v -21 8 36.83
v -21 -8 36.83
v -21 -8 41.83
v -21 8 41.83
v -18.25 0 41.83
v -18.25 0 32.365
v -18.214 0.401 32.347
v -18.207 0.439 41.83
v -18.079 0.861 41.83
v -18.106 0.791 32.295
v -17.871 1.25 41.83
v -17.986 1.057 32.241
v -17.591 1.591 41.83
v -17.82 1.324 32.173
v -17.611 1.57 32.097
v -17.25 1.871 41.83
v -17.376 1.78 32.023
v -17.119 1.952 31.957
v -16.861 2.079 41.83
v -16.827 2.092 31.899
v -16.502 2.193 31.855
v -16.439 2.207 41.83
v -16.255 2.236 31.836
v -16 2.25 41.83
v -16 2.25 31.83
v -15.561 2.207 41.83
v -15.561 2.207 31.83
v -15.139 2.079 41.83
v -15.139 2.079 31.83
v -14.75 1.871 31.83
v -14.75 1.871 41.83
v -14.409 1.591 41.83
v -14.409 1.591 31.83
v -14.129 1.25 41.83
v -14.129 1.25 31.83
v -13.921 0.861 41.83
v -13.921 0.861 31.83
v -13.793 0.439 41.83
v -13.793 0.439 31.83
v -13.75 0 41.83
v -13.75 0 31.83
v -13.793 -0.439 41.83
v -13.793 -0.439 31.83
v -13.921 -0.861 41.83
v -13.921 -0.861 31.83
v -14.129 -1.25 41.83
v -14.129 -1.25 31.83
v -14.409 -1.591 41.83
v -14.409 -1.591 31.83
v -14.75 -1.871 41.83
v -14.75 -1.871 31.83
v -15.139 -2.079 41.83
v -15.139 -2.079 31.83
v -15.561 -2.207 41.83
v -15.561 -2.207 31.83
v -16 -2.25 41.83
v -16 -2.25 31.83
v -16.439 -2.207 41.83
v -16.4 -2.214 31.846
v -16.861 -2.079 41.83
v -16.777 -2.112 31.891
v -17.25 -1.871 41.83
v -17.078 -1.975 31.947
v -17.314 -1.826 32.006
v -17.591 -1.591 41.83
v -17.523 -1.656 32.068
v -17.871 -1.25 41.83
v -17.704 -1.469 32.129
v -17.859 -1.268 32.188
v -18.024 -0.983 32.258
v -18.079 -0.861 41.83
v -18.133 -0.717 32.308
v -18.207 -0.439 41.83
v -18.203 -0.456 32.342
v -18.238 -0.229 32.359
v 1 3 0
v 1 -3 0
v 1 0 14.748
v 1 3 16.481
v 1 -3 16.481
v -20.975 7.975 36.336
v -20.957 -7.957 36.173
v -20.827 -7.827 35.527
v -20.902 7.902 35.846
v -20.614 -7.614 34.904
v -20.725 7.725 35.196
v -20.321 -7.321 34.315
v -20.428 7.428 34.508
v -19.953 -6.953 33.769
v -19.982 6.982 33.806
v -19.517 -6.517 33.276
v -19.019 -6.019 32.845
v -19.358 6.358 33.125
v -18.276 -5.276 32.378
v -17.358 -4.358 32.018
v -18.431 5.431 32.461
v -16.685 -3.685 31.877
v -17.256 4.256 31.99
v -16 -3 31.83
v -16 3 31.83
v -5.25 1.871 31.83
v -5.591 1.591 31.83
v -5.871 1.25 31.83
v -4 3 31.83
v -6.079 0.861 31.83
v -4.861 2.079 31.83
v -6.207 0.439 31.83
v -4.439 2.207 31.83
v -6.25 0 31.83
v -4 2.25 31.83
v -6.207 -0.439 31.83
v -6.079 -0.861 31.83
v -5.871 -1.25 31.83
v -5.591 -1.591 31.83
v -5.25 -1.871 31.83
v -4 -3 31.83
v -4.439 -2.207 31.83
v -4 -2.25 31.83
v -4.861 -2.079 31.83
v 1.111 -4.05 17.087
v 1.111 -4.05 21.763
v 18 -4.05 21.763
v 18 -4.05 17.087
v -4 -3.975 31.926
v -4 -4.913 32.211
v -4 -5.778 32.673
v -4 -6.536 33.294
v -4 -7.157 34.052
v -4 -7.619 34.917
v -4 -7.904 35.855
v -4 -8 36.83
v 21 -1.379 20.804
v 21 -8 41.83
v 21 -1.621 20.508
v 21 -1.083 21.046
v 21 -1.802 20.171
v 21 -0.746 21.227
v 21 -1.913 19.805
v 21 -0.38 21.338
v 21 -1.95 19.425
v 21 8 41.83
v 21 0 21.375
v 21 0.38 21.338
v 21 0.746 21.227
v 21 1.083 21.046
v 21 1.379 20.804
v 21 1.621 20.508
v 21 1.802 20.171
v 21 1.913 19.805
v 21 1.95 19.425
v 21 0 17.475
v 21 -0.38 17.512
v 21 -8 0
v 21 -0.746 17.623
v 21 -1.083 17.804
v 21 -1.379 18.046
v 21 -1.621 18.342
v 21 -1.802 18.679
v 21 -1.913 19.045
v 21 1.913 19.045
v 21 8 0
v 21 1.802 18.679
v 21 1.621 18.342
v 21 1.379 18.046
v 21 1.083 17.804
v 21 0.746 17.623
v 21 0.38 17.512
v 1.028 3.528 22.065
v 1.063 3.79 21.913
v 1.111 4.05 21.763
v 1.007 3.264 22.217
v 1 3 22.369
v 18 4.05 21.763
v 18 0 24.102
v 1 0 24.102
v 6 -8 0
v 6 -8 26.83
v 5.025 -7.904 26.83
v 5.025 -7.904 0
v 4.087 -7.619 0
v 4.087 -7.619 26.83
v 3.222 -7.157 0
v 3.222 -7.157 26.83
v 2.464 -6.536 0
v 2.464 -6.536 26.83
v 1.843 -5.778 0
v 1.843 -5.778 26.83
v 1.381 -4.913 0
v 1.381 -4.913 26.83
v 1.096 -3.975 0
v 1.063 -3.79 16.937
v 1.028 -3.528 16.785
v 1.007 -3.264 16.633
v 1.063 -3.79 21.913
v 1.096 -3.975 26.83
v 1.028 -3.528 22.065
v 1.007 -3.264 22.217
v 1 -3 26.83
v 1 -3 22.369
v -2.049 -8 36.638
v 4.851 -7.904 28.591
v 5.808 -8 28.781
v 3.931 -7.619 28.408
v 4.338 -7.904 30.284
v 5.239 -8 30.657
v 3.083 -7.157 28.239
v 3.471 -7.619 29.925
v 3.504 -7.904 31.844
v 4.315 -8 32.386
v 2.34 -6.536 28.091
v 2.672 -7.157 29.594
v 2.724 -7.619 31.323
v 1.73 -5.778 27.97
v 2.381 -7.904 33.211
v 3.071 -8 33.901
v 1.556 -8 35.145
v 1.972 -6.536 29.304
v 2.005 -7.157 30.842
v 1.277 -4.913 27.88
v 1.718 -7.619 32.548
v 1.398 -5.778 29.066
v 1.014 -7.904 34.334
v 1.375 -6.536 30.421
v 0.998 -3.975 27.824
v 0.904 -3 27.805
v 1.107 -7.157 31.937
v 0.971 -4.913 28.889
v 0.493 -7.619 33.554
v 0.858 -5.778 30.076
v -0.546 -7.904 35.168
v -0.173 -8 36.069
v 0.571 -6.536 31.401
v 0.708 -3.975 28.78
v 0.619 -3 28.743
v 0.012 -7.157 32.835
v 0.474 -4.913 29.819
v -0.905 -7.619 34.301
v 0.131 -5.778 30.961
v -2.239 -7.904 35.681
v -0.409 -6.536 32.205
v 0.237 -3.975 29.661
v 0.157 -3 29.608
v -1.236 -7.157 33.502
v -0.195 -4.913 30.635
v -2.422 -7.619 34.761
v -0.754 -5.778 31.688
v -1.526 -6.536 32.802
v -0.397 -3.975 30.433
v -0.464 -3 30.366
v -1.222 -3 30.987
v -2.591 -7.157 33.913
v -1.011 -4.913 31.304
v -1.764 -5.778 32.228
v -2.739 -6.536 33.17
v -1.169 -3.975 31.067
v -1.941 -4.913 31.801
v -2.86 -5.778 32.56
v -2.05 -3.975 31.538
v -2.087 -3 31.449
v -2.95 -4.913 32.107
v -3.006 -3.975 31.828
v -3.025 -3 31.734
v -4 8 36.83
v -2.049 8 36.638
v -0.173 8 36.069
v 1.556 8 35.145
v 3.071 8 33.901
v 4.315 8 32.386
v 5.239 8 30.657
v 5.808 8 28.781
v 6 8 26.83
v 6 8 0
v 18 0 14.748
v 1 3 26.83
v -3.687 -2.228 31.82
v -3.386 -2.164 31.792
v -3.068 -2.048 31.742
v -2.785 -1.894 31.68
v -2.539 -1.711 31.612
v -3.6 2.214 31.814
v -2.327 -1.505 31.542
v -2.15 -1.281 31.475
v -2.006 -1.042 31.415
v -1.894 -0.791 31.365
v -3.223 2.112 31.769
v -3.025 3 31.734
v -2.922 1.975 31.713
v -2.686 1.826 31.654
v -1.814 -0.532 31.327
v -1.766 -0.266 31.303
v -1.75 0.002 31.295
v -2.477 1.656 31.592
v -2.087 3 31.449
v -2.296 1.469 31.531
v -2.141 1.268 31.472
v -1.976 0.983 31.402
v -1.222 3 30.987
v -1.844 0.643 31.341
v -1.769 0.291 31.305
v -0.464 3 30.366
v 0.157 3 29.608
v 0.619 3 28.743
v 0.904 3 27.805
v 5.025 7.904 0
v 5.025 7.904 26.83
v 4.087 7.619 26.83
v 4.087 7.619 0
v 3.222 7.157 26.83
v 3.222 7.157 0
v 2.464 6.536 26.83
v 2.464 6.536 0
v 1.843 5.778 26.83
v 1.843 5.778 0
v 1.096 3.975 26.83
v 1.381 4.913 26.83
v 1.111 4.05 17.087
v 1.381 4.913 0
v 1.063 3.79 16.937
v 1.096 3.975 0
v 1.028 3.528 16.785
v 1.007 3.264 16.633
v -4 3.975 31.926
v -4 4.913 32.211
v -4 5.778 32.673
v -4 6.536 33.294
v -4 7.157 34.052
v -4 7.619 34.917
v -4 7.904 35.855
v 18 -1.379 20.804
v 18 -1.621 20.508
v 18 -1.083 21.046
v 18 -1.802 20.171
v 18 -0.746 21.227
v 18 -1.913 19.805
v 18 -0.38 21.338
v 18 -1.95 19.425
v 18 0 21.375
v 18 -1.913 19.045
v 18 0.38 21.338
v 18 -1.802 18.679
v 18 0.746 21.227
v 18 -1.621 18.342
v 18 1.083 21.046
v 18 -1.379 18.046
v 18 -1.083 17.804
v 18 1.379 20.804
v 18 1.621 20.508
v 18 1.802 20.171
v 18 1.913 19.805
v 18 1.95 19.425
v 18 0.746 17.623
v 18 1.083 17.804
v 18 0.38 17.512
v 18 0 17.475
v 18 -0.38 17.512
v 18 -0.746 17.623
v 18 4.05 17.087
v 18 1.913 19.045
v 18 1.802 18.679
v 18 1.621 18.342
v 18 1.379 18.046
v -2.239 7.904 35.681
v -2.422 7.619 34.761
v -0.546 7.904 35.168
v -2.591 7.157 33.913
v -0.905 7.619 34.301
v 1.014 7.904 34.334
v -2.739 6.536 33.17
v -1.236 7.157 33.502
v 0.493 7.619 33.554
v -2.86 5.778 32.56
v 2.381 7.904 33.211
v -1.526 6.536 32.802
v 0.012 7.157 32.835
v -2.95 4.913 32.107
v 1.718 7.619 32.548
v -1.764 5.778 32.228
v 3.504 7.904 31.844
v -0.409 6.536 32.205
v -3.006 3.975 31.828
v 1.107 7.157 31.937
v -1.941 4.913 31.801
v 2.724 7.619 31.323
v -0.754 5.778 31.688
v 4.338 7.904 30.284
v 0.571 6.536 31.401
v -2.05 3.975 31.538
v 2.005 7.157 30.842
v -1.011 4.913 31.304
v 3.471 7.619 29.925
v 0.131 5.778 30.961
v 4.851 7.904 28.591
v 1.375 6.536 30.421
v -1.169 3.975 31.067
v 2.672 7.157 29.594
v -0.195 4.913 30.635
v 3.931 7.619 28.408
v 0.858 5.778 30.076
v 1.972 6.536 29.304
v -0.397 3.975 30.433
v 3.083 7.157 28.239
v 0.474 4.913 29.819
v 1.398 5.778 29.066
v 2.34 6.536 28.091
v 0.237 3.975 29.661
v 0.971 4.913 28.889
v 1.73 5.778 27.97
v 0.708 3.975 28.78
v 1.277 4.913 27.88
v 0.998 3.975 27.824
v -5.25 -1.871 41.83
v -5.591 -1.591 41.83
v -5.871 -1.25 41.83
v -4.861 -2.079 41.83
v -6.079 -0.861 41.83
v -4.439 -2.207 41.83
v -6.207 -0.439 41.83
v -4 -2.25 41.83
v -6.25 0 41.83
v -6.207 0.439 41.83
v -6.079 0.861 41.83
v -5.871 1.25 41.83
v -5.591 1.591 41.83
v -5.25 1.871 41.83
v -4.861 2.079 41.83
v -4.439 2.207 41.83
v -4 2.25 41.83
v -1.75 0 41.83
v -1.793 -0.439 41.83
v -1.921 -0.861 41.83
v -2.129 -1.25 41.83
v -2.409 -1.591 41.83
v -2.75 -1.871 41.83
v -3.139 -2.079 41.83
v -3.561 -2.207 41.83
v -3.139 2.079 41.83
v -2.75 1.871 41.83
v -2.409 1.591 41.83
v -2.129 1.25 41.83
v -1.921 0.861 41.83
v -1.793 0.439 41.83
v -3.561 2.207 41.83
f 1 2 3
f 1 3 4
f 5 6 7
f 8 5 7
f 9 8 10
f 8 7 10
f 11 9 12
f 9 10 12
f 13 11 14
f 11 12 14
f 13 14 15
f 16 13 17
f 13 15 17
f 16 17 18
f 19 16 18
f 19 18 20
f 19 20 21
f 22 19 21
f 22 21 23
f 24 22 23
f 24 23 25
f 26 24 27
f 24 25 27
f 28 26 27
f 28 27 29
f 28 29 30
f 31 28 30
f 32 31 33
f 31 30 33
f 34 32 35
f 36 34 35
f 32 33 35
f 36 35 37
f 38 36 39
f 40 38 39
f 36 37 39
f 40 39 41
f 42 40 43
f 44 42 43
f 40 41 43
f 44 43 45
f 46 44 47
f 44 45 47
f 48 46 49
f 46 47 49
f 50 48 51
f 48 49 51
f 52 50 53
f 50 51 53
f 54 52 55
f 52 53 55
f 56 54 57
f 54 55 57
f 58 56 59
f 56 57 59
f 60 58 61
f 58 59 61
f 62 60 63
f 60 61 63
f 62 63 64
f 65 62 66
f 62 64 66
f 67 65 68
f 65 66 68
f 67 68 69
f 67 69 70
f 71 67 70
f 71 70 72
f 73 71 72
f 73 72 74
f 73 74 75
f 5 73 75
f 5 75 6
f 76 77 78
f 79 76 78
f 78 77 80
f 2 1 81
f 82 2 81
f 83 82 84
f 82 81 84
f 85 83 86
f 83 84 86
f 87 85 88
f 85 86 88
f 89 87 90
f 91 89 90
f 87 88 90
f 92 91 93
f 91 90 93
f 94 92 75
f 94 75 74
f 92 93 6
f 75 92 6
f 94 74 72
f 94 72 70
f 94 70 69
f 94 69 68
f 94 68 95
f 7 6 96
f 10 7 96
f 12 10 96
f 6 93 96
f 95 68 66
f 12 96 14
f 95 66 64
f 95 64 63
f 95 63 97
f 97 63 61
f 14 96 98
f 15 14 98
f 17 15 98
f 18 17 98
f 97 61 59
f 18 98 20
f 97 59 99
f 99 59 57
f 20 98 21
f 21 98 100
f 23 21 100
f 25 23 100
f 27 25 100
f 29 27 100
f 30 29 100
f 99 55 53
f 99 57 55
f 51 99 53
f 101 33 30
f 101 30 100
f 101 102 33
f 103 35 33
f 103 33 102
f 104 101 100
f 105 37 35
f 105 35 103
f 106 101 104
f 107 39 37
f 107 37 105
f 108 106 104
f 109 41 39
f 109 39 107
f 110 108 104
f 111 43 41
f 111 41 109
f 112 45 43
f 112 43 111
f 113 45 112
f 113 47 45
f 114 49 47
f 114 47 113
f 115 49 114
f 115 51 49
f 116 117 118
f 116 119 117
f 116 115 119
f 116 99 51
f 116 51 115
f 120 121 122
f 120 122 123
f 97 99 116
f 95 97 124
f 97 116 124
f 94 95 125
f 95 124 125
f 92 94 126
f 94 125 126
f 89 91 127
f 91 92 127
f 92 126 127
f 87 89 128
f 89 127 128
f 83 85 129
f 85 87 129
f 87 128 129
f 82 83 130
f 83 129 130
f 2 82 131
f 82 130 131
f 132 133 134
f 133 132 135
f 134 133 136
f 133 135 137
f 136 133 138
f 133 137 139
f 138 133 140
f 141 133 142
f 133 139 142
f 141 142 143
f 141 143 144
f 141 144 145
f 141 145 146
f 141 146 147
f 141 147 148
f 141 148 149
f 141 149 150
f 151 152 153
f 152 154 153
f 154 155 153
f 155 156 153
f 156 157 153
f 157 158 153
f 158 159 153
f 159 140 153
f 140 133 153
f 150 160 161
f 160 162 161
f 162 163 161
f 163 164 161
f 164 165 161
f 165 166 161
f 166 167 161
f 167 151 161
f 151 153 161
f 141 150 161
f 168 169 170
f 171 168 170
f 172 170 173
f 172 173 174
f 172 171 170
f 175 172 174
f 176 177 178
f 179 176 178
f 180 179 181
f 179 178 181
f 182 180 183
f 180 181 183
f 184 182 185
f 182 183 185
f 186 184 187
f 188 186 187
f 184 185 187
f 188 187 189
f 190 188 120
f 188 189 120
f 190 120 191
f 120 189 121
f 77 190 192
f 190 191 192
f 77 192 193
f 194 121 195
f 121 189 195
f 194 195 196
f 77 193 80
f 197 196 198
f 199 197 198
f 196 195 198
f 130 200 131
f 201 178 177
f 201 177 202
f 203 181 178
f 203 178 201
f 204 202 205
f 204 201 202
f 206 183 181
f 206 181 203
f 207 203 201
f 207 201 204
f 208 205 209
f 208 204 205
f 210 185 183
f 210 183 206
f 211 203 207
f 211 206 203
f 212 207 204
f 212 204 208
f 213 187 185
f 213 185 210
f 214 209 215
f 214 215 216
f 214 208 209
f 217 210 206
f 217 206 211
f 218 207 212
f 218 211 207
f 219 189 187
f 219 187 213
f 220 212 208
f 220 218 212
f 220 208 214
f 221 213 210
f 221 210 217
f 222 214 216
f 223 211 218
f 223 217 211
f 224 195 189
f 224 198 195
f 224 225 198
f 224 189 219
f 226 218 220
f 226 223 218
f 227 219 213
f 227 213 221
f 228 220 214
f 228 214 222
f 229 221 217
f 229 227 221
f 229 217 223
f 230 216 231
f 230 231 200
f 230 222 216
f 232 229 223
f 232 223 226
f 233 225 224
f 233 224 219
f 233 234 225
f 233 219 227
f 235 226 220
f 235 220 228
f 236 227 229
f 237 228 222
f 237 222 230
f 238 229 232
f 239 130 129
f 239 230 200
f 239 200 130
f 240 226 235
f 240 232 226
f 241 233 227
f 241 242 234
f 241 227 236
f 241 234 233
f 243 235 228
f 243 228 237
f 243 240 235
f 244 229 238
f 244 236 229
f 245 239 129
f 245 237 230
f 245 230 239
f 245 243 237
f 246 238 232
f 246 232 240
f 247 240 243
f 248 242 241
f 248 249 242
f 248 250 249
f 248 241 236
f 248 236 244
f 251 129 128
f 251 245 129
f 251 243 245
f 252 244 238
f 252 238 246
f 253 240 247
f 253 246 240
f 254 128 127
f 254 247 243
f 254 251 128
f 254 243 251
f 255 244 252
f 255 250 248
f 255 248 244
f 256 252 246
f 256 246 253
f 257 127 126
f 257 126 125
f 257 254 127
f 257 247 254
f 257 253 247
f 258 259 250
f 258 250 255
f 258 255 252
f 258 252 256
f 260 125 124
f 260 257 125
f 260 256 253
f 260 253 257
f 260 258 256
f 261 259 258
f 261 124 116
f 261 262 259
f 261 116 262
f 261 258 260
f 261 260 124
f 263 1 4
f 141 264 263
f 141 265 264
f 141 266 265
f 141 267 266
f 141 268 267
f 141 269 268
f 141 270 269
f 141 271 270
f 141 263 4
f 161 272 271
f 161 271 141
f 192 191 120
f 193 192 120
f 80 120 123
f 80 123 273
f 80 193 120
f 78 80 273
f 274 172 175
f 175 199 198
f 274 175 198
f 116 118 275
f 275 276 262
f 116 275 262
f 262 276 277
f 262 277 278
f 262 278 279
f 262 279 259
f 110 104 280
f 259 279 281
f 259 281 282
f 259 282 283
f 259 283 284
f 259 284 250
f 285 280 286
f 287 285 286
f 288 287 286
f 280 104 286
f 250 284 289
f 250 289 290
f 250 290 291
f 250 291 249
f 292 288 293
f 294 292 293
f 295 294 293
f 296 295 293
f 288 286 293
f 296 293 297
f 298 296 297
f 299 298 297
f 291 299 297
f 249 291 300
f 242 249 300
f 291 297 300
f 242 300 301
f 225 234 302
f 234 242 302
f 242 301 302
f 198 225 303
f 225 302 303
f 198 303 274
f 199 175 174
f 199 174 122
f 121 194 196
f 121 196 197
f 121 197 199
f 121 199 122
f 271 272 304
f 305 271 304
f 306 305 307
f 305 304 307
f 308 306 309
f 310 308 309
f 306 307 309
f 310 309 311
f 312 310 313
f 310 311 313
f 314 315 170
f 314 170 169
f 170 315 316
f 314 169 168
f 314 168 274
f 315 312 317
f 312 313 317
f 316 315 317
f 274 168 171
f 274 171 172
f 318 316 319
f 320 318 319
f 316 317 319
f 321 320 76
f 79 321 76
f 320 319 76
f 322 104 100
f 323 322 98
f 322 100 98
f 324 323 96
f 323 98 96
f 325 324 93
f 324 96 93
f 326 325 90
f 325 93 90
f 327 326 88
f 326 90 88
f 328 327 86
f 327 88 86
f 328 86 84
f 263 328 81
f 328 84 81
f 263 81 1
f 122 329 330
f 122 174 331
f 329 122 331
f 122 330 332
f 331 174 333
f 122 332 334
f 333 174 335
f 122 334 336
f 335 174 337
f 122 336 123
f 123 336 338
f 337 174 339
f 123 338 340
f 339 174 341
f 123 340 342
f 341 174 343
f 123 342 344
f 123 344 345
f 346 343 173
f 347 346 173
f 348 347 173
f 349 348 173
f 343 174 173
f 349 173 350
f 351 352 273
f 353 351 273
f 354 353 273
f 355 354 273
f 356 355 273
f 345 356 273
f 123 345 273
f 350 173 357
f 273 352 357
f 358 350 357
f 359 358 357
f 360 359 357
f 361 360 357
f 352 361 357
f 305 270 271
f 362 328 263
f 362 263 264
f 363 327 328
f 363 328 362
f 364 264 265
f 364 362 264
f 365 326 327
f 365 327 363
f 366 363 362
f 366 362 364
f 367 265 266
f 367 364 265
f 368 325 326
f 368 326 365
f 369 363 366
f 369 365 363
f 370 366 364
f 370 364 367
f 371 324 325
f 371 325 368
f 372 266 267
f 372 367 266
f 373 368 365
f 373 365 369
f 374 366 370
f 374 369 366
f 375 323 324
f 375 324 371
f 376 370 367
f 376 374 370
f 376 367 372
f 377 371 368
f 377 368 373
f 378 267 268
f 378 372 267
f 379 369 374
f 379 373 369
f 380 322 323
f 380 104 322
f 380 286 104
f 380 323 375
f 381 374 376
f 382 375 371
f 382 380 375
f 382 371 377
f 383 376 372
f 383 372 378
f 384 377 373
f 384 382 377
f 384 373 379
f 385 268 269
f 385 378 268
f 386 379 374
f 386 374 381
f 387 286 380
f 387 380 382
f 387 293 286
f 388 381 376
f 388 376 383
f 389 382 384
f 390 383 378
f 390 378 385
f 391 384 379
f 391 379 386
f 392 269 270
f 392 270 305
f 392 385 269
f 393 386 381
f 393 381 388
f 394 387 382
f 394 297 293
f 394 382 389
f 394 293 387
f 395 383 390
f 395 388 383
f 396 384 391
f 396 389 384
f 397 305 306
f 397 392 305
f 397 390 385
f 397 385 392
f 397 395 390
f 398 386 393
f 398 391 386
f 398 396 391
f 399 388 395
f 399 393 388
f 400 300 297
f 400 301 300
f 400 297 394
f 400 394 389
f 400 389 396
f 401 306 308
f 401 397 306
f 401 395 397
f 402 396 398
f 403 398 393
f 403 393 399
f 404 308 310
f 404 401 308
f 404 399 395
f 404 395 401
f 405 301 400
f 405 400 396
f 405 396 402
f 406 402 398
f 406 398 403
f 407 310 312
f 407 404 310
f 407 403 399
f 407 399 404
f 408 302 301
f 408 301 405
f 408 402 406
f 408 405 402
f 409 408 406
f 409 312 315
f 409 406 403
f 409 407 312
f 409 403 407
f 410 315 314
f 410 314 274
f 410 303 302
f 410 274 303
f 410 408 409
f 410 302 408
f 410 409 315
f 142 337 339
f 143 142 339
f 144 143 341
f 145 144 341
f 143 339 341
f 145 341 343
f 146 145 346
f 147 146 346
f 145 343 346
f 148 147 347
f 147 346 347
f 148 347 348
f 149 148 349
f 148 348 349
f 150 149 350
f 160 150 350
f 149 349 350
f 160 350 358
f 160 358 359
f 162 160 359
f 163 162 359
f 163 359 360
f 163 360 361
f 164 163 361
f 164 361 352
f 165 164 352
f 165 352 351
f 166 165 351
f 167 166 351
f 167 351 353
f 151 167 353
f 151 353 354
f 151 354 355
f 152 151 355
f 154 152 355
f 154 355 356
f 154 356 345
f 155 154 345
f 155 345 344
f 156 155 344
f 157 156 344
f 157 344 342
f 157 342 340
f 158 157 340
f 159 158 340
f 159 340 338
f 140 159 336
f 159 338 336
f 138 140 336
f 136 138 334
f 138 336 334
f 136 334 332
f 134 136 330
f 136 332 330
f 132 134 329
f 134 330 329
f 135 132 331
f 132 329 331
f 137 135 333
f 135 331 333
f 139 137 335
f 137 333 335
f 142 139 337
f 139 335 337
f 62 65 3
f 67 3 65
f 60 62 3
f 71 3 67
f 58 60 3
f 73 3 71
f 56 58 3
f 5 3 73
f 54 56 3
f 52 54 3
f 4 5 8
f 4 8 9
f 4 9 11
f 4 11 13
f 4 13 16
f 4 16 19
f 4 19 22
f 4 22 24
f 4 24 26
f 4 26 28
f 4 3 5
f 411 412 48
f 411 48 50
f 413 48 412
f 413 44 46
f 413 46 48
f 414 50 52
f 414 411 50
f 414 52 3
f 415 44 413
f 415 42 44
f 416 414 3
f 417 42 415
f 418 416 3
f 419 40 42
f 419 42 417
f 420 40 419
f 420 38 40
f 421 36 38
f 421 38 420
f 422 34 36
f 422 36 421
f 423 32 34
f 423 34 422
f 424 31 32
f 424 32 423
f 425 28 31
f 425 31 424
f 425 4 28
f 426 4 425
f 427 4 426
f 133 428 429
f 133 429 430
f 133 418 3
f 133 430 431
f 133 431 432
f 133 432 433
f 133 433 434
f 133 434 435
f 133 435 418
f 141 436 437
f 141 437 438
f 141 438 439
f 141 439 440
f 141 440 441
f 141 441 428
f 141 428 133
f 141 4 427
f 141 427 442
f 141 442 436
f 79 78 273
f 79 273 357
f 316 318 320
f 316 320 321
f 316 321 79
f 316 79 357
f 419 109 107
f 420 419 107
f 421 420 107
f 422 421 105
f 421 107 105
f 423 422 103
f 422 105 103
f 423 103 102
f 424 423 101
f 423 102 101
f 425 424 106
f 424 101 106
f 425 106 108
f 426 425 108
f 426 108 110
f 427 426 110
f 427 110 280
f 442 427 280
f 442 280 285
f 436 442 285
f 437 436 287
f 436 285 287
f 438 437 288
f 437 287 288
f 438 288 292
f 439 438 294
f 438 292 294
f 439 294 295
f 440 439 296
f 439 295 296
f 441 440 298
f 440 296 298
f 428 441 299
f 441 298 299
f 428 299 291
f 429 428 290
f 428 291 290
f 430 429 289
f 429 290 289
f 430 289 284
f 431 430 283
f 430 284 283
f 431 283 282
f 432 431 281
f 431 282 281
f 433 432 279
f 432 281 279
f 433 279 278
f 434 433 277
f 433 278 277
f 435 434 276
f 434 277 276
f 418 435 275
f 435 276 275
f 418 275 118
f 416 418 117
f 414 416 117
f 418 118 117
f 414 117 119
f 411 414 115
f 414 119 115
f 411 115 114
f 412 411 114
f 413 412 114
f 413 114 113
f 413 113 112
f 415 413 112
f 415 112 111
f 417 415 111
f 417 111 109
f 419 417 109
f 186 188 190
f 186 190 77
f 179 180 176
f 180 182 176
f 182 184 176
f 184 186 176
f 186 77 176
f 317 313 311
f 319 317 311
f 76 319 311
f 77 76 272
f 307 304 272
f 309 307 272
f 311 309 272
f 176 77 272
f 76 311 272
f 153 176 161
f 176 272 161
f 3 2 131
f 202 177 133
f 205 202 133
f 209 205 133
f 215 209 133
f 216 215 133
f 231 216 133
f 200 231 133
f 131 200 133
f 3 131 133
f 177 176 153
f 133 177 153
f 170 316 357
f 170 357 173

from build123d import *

# Parameters (mm, degrees)
ESQUISSE1_W                     = 42
ESQUISSE1_H                     = 16
BOSS_EXTRU_1_DEPTH              = 41.83
ESQUISSE2_W                     = 22
ESQUISSE2_H                     = 31.83
ENL_V_MAT_EXTRU_1_DEPTH         = 50.464622712
CONG_1_R                        = 5
D_GAGEMENT_M3_51_D              = 3.9
DIAM_TRE_DU_PER_AGE_4_5_4_5_2_D = 4.5
ENL_V_MAT_EXTRU_2_DEPTH         = 17


with BuildPart() as part:
    # Esquisse1 → Boss.-Extru.1 (new body)
    with BuildSketch(Plane.XY):
        Rectangle(ESQUISSE1_W, ESQUISSE1_H)
    extrude(amount=BOSS_EXTRU_1_DEPTH)

    # Esquisse2 → Enlèv. mat.-Extru.1 (cut, through all)
    with BuildSketch(Plane.XZ.offset(8)):
        with Locations((-10, 15.915)):
            Rectangle(ESQUISSE2_W, ESQUISSE2_H)
    extrude(amount=-ENL_V_MAT_EXTRU_1_DEPTH, mode=Mode.SUBTRACT)

    # Congé1
    cong_1_edges = [part.edges().sort_by_distance(p)[0] for p in [
        (-10, 8, 31.83),
        (-21, 0, 31.83),
        (1, 8, 15.915),
        (1, 0, 31.83),
        (1, -8, 15.915),
        (-10, -8, 31.83),
    ]]
    fillet(cong_1_edges, radius=CONG_1_R)

    # Dégagement M3.51 (through all)
    with Locations(Plane(origin=(21, 0, 0), x_dir=(0, 0, -1), z_dir=(1, 0, 0))):
        with Locations((-19.425, 0)):
            Hole(D_GAGEMENT_M3_51_D / 2)

    # Diamètre du perçage Ø4.5 (4.5)2 (through all)
    with Locations(Plane.XY.offset(41.83)):
        with Locations((-16, 0), (-4, 0)):
            Hole(DIAM_TRE_DU_PER_AGE_4_5_4_5_2_D / 2)

    # Esquisse7 → Enlèv. mat.-Extru.2 (cut)
    with BuildSketch(Plane(origin=(1, 0, 0), x_dir=(0, 0, -1), z_dir=(1, 0, 0))):
        Polygon((-24.10153718, 0), (-21.76326859, -4.05), (-17.08673141, -4.05), (-14.74846282, 0), (-17.08673141, 4.05), (-21.76326859, 4.05), align=None)
    extrude(amount=ENL_V_MAT_EXTRU_2_DEPTH, mode=Mode.SUBTRACT)


solid = part.part
